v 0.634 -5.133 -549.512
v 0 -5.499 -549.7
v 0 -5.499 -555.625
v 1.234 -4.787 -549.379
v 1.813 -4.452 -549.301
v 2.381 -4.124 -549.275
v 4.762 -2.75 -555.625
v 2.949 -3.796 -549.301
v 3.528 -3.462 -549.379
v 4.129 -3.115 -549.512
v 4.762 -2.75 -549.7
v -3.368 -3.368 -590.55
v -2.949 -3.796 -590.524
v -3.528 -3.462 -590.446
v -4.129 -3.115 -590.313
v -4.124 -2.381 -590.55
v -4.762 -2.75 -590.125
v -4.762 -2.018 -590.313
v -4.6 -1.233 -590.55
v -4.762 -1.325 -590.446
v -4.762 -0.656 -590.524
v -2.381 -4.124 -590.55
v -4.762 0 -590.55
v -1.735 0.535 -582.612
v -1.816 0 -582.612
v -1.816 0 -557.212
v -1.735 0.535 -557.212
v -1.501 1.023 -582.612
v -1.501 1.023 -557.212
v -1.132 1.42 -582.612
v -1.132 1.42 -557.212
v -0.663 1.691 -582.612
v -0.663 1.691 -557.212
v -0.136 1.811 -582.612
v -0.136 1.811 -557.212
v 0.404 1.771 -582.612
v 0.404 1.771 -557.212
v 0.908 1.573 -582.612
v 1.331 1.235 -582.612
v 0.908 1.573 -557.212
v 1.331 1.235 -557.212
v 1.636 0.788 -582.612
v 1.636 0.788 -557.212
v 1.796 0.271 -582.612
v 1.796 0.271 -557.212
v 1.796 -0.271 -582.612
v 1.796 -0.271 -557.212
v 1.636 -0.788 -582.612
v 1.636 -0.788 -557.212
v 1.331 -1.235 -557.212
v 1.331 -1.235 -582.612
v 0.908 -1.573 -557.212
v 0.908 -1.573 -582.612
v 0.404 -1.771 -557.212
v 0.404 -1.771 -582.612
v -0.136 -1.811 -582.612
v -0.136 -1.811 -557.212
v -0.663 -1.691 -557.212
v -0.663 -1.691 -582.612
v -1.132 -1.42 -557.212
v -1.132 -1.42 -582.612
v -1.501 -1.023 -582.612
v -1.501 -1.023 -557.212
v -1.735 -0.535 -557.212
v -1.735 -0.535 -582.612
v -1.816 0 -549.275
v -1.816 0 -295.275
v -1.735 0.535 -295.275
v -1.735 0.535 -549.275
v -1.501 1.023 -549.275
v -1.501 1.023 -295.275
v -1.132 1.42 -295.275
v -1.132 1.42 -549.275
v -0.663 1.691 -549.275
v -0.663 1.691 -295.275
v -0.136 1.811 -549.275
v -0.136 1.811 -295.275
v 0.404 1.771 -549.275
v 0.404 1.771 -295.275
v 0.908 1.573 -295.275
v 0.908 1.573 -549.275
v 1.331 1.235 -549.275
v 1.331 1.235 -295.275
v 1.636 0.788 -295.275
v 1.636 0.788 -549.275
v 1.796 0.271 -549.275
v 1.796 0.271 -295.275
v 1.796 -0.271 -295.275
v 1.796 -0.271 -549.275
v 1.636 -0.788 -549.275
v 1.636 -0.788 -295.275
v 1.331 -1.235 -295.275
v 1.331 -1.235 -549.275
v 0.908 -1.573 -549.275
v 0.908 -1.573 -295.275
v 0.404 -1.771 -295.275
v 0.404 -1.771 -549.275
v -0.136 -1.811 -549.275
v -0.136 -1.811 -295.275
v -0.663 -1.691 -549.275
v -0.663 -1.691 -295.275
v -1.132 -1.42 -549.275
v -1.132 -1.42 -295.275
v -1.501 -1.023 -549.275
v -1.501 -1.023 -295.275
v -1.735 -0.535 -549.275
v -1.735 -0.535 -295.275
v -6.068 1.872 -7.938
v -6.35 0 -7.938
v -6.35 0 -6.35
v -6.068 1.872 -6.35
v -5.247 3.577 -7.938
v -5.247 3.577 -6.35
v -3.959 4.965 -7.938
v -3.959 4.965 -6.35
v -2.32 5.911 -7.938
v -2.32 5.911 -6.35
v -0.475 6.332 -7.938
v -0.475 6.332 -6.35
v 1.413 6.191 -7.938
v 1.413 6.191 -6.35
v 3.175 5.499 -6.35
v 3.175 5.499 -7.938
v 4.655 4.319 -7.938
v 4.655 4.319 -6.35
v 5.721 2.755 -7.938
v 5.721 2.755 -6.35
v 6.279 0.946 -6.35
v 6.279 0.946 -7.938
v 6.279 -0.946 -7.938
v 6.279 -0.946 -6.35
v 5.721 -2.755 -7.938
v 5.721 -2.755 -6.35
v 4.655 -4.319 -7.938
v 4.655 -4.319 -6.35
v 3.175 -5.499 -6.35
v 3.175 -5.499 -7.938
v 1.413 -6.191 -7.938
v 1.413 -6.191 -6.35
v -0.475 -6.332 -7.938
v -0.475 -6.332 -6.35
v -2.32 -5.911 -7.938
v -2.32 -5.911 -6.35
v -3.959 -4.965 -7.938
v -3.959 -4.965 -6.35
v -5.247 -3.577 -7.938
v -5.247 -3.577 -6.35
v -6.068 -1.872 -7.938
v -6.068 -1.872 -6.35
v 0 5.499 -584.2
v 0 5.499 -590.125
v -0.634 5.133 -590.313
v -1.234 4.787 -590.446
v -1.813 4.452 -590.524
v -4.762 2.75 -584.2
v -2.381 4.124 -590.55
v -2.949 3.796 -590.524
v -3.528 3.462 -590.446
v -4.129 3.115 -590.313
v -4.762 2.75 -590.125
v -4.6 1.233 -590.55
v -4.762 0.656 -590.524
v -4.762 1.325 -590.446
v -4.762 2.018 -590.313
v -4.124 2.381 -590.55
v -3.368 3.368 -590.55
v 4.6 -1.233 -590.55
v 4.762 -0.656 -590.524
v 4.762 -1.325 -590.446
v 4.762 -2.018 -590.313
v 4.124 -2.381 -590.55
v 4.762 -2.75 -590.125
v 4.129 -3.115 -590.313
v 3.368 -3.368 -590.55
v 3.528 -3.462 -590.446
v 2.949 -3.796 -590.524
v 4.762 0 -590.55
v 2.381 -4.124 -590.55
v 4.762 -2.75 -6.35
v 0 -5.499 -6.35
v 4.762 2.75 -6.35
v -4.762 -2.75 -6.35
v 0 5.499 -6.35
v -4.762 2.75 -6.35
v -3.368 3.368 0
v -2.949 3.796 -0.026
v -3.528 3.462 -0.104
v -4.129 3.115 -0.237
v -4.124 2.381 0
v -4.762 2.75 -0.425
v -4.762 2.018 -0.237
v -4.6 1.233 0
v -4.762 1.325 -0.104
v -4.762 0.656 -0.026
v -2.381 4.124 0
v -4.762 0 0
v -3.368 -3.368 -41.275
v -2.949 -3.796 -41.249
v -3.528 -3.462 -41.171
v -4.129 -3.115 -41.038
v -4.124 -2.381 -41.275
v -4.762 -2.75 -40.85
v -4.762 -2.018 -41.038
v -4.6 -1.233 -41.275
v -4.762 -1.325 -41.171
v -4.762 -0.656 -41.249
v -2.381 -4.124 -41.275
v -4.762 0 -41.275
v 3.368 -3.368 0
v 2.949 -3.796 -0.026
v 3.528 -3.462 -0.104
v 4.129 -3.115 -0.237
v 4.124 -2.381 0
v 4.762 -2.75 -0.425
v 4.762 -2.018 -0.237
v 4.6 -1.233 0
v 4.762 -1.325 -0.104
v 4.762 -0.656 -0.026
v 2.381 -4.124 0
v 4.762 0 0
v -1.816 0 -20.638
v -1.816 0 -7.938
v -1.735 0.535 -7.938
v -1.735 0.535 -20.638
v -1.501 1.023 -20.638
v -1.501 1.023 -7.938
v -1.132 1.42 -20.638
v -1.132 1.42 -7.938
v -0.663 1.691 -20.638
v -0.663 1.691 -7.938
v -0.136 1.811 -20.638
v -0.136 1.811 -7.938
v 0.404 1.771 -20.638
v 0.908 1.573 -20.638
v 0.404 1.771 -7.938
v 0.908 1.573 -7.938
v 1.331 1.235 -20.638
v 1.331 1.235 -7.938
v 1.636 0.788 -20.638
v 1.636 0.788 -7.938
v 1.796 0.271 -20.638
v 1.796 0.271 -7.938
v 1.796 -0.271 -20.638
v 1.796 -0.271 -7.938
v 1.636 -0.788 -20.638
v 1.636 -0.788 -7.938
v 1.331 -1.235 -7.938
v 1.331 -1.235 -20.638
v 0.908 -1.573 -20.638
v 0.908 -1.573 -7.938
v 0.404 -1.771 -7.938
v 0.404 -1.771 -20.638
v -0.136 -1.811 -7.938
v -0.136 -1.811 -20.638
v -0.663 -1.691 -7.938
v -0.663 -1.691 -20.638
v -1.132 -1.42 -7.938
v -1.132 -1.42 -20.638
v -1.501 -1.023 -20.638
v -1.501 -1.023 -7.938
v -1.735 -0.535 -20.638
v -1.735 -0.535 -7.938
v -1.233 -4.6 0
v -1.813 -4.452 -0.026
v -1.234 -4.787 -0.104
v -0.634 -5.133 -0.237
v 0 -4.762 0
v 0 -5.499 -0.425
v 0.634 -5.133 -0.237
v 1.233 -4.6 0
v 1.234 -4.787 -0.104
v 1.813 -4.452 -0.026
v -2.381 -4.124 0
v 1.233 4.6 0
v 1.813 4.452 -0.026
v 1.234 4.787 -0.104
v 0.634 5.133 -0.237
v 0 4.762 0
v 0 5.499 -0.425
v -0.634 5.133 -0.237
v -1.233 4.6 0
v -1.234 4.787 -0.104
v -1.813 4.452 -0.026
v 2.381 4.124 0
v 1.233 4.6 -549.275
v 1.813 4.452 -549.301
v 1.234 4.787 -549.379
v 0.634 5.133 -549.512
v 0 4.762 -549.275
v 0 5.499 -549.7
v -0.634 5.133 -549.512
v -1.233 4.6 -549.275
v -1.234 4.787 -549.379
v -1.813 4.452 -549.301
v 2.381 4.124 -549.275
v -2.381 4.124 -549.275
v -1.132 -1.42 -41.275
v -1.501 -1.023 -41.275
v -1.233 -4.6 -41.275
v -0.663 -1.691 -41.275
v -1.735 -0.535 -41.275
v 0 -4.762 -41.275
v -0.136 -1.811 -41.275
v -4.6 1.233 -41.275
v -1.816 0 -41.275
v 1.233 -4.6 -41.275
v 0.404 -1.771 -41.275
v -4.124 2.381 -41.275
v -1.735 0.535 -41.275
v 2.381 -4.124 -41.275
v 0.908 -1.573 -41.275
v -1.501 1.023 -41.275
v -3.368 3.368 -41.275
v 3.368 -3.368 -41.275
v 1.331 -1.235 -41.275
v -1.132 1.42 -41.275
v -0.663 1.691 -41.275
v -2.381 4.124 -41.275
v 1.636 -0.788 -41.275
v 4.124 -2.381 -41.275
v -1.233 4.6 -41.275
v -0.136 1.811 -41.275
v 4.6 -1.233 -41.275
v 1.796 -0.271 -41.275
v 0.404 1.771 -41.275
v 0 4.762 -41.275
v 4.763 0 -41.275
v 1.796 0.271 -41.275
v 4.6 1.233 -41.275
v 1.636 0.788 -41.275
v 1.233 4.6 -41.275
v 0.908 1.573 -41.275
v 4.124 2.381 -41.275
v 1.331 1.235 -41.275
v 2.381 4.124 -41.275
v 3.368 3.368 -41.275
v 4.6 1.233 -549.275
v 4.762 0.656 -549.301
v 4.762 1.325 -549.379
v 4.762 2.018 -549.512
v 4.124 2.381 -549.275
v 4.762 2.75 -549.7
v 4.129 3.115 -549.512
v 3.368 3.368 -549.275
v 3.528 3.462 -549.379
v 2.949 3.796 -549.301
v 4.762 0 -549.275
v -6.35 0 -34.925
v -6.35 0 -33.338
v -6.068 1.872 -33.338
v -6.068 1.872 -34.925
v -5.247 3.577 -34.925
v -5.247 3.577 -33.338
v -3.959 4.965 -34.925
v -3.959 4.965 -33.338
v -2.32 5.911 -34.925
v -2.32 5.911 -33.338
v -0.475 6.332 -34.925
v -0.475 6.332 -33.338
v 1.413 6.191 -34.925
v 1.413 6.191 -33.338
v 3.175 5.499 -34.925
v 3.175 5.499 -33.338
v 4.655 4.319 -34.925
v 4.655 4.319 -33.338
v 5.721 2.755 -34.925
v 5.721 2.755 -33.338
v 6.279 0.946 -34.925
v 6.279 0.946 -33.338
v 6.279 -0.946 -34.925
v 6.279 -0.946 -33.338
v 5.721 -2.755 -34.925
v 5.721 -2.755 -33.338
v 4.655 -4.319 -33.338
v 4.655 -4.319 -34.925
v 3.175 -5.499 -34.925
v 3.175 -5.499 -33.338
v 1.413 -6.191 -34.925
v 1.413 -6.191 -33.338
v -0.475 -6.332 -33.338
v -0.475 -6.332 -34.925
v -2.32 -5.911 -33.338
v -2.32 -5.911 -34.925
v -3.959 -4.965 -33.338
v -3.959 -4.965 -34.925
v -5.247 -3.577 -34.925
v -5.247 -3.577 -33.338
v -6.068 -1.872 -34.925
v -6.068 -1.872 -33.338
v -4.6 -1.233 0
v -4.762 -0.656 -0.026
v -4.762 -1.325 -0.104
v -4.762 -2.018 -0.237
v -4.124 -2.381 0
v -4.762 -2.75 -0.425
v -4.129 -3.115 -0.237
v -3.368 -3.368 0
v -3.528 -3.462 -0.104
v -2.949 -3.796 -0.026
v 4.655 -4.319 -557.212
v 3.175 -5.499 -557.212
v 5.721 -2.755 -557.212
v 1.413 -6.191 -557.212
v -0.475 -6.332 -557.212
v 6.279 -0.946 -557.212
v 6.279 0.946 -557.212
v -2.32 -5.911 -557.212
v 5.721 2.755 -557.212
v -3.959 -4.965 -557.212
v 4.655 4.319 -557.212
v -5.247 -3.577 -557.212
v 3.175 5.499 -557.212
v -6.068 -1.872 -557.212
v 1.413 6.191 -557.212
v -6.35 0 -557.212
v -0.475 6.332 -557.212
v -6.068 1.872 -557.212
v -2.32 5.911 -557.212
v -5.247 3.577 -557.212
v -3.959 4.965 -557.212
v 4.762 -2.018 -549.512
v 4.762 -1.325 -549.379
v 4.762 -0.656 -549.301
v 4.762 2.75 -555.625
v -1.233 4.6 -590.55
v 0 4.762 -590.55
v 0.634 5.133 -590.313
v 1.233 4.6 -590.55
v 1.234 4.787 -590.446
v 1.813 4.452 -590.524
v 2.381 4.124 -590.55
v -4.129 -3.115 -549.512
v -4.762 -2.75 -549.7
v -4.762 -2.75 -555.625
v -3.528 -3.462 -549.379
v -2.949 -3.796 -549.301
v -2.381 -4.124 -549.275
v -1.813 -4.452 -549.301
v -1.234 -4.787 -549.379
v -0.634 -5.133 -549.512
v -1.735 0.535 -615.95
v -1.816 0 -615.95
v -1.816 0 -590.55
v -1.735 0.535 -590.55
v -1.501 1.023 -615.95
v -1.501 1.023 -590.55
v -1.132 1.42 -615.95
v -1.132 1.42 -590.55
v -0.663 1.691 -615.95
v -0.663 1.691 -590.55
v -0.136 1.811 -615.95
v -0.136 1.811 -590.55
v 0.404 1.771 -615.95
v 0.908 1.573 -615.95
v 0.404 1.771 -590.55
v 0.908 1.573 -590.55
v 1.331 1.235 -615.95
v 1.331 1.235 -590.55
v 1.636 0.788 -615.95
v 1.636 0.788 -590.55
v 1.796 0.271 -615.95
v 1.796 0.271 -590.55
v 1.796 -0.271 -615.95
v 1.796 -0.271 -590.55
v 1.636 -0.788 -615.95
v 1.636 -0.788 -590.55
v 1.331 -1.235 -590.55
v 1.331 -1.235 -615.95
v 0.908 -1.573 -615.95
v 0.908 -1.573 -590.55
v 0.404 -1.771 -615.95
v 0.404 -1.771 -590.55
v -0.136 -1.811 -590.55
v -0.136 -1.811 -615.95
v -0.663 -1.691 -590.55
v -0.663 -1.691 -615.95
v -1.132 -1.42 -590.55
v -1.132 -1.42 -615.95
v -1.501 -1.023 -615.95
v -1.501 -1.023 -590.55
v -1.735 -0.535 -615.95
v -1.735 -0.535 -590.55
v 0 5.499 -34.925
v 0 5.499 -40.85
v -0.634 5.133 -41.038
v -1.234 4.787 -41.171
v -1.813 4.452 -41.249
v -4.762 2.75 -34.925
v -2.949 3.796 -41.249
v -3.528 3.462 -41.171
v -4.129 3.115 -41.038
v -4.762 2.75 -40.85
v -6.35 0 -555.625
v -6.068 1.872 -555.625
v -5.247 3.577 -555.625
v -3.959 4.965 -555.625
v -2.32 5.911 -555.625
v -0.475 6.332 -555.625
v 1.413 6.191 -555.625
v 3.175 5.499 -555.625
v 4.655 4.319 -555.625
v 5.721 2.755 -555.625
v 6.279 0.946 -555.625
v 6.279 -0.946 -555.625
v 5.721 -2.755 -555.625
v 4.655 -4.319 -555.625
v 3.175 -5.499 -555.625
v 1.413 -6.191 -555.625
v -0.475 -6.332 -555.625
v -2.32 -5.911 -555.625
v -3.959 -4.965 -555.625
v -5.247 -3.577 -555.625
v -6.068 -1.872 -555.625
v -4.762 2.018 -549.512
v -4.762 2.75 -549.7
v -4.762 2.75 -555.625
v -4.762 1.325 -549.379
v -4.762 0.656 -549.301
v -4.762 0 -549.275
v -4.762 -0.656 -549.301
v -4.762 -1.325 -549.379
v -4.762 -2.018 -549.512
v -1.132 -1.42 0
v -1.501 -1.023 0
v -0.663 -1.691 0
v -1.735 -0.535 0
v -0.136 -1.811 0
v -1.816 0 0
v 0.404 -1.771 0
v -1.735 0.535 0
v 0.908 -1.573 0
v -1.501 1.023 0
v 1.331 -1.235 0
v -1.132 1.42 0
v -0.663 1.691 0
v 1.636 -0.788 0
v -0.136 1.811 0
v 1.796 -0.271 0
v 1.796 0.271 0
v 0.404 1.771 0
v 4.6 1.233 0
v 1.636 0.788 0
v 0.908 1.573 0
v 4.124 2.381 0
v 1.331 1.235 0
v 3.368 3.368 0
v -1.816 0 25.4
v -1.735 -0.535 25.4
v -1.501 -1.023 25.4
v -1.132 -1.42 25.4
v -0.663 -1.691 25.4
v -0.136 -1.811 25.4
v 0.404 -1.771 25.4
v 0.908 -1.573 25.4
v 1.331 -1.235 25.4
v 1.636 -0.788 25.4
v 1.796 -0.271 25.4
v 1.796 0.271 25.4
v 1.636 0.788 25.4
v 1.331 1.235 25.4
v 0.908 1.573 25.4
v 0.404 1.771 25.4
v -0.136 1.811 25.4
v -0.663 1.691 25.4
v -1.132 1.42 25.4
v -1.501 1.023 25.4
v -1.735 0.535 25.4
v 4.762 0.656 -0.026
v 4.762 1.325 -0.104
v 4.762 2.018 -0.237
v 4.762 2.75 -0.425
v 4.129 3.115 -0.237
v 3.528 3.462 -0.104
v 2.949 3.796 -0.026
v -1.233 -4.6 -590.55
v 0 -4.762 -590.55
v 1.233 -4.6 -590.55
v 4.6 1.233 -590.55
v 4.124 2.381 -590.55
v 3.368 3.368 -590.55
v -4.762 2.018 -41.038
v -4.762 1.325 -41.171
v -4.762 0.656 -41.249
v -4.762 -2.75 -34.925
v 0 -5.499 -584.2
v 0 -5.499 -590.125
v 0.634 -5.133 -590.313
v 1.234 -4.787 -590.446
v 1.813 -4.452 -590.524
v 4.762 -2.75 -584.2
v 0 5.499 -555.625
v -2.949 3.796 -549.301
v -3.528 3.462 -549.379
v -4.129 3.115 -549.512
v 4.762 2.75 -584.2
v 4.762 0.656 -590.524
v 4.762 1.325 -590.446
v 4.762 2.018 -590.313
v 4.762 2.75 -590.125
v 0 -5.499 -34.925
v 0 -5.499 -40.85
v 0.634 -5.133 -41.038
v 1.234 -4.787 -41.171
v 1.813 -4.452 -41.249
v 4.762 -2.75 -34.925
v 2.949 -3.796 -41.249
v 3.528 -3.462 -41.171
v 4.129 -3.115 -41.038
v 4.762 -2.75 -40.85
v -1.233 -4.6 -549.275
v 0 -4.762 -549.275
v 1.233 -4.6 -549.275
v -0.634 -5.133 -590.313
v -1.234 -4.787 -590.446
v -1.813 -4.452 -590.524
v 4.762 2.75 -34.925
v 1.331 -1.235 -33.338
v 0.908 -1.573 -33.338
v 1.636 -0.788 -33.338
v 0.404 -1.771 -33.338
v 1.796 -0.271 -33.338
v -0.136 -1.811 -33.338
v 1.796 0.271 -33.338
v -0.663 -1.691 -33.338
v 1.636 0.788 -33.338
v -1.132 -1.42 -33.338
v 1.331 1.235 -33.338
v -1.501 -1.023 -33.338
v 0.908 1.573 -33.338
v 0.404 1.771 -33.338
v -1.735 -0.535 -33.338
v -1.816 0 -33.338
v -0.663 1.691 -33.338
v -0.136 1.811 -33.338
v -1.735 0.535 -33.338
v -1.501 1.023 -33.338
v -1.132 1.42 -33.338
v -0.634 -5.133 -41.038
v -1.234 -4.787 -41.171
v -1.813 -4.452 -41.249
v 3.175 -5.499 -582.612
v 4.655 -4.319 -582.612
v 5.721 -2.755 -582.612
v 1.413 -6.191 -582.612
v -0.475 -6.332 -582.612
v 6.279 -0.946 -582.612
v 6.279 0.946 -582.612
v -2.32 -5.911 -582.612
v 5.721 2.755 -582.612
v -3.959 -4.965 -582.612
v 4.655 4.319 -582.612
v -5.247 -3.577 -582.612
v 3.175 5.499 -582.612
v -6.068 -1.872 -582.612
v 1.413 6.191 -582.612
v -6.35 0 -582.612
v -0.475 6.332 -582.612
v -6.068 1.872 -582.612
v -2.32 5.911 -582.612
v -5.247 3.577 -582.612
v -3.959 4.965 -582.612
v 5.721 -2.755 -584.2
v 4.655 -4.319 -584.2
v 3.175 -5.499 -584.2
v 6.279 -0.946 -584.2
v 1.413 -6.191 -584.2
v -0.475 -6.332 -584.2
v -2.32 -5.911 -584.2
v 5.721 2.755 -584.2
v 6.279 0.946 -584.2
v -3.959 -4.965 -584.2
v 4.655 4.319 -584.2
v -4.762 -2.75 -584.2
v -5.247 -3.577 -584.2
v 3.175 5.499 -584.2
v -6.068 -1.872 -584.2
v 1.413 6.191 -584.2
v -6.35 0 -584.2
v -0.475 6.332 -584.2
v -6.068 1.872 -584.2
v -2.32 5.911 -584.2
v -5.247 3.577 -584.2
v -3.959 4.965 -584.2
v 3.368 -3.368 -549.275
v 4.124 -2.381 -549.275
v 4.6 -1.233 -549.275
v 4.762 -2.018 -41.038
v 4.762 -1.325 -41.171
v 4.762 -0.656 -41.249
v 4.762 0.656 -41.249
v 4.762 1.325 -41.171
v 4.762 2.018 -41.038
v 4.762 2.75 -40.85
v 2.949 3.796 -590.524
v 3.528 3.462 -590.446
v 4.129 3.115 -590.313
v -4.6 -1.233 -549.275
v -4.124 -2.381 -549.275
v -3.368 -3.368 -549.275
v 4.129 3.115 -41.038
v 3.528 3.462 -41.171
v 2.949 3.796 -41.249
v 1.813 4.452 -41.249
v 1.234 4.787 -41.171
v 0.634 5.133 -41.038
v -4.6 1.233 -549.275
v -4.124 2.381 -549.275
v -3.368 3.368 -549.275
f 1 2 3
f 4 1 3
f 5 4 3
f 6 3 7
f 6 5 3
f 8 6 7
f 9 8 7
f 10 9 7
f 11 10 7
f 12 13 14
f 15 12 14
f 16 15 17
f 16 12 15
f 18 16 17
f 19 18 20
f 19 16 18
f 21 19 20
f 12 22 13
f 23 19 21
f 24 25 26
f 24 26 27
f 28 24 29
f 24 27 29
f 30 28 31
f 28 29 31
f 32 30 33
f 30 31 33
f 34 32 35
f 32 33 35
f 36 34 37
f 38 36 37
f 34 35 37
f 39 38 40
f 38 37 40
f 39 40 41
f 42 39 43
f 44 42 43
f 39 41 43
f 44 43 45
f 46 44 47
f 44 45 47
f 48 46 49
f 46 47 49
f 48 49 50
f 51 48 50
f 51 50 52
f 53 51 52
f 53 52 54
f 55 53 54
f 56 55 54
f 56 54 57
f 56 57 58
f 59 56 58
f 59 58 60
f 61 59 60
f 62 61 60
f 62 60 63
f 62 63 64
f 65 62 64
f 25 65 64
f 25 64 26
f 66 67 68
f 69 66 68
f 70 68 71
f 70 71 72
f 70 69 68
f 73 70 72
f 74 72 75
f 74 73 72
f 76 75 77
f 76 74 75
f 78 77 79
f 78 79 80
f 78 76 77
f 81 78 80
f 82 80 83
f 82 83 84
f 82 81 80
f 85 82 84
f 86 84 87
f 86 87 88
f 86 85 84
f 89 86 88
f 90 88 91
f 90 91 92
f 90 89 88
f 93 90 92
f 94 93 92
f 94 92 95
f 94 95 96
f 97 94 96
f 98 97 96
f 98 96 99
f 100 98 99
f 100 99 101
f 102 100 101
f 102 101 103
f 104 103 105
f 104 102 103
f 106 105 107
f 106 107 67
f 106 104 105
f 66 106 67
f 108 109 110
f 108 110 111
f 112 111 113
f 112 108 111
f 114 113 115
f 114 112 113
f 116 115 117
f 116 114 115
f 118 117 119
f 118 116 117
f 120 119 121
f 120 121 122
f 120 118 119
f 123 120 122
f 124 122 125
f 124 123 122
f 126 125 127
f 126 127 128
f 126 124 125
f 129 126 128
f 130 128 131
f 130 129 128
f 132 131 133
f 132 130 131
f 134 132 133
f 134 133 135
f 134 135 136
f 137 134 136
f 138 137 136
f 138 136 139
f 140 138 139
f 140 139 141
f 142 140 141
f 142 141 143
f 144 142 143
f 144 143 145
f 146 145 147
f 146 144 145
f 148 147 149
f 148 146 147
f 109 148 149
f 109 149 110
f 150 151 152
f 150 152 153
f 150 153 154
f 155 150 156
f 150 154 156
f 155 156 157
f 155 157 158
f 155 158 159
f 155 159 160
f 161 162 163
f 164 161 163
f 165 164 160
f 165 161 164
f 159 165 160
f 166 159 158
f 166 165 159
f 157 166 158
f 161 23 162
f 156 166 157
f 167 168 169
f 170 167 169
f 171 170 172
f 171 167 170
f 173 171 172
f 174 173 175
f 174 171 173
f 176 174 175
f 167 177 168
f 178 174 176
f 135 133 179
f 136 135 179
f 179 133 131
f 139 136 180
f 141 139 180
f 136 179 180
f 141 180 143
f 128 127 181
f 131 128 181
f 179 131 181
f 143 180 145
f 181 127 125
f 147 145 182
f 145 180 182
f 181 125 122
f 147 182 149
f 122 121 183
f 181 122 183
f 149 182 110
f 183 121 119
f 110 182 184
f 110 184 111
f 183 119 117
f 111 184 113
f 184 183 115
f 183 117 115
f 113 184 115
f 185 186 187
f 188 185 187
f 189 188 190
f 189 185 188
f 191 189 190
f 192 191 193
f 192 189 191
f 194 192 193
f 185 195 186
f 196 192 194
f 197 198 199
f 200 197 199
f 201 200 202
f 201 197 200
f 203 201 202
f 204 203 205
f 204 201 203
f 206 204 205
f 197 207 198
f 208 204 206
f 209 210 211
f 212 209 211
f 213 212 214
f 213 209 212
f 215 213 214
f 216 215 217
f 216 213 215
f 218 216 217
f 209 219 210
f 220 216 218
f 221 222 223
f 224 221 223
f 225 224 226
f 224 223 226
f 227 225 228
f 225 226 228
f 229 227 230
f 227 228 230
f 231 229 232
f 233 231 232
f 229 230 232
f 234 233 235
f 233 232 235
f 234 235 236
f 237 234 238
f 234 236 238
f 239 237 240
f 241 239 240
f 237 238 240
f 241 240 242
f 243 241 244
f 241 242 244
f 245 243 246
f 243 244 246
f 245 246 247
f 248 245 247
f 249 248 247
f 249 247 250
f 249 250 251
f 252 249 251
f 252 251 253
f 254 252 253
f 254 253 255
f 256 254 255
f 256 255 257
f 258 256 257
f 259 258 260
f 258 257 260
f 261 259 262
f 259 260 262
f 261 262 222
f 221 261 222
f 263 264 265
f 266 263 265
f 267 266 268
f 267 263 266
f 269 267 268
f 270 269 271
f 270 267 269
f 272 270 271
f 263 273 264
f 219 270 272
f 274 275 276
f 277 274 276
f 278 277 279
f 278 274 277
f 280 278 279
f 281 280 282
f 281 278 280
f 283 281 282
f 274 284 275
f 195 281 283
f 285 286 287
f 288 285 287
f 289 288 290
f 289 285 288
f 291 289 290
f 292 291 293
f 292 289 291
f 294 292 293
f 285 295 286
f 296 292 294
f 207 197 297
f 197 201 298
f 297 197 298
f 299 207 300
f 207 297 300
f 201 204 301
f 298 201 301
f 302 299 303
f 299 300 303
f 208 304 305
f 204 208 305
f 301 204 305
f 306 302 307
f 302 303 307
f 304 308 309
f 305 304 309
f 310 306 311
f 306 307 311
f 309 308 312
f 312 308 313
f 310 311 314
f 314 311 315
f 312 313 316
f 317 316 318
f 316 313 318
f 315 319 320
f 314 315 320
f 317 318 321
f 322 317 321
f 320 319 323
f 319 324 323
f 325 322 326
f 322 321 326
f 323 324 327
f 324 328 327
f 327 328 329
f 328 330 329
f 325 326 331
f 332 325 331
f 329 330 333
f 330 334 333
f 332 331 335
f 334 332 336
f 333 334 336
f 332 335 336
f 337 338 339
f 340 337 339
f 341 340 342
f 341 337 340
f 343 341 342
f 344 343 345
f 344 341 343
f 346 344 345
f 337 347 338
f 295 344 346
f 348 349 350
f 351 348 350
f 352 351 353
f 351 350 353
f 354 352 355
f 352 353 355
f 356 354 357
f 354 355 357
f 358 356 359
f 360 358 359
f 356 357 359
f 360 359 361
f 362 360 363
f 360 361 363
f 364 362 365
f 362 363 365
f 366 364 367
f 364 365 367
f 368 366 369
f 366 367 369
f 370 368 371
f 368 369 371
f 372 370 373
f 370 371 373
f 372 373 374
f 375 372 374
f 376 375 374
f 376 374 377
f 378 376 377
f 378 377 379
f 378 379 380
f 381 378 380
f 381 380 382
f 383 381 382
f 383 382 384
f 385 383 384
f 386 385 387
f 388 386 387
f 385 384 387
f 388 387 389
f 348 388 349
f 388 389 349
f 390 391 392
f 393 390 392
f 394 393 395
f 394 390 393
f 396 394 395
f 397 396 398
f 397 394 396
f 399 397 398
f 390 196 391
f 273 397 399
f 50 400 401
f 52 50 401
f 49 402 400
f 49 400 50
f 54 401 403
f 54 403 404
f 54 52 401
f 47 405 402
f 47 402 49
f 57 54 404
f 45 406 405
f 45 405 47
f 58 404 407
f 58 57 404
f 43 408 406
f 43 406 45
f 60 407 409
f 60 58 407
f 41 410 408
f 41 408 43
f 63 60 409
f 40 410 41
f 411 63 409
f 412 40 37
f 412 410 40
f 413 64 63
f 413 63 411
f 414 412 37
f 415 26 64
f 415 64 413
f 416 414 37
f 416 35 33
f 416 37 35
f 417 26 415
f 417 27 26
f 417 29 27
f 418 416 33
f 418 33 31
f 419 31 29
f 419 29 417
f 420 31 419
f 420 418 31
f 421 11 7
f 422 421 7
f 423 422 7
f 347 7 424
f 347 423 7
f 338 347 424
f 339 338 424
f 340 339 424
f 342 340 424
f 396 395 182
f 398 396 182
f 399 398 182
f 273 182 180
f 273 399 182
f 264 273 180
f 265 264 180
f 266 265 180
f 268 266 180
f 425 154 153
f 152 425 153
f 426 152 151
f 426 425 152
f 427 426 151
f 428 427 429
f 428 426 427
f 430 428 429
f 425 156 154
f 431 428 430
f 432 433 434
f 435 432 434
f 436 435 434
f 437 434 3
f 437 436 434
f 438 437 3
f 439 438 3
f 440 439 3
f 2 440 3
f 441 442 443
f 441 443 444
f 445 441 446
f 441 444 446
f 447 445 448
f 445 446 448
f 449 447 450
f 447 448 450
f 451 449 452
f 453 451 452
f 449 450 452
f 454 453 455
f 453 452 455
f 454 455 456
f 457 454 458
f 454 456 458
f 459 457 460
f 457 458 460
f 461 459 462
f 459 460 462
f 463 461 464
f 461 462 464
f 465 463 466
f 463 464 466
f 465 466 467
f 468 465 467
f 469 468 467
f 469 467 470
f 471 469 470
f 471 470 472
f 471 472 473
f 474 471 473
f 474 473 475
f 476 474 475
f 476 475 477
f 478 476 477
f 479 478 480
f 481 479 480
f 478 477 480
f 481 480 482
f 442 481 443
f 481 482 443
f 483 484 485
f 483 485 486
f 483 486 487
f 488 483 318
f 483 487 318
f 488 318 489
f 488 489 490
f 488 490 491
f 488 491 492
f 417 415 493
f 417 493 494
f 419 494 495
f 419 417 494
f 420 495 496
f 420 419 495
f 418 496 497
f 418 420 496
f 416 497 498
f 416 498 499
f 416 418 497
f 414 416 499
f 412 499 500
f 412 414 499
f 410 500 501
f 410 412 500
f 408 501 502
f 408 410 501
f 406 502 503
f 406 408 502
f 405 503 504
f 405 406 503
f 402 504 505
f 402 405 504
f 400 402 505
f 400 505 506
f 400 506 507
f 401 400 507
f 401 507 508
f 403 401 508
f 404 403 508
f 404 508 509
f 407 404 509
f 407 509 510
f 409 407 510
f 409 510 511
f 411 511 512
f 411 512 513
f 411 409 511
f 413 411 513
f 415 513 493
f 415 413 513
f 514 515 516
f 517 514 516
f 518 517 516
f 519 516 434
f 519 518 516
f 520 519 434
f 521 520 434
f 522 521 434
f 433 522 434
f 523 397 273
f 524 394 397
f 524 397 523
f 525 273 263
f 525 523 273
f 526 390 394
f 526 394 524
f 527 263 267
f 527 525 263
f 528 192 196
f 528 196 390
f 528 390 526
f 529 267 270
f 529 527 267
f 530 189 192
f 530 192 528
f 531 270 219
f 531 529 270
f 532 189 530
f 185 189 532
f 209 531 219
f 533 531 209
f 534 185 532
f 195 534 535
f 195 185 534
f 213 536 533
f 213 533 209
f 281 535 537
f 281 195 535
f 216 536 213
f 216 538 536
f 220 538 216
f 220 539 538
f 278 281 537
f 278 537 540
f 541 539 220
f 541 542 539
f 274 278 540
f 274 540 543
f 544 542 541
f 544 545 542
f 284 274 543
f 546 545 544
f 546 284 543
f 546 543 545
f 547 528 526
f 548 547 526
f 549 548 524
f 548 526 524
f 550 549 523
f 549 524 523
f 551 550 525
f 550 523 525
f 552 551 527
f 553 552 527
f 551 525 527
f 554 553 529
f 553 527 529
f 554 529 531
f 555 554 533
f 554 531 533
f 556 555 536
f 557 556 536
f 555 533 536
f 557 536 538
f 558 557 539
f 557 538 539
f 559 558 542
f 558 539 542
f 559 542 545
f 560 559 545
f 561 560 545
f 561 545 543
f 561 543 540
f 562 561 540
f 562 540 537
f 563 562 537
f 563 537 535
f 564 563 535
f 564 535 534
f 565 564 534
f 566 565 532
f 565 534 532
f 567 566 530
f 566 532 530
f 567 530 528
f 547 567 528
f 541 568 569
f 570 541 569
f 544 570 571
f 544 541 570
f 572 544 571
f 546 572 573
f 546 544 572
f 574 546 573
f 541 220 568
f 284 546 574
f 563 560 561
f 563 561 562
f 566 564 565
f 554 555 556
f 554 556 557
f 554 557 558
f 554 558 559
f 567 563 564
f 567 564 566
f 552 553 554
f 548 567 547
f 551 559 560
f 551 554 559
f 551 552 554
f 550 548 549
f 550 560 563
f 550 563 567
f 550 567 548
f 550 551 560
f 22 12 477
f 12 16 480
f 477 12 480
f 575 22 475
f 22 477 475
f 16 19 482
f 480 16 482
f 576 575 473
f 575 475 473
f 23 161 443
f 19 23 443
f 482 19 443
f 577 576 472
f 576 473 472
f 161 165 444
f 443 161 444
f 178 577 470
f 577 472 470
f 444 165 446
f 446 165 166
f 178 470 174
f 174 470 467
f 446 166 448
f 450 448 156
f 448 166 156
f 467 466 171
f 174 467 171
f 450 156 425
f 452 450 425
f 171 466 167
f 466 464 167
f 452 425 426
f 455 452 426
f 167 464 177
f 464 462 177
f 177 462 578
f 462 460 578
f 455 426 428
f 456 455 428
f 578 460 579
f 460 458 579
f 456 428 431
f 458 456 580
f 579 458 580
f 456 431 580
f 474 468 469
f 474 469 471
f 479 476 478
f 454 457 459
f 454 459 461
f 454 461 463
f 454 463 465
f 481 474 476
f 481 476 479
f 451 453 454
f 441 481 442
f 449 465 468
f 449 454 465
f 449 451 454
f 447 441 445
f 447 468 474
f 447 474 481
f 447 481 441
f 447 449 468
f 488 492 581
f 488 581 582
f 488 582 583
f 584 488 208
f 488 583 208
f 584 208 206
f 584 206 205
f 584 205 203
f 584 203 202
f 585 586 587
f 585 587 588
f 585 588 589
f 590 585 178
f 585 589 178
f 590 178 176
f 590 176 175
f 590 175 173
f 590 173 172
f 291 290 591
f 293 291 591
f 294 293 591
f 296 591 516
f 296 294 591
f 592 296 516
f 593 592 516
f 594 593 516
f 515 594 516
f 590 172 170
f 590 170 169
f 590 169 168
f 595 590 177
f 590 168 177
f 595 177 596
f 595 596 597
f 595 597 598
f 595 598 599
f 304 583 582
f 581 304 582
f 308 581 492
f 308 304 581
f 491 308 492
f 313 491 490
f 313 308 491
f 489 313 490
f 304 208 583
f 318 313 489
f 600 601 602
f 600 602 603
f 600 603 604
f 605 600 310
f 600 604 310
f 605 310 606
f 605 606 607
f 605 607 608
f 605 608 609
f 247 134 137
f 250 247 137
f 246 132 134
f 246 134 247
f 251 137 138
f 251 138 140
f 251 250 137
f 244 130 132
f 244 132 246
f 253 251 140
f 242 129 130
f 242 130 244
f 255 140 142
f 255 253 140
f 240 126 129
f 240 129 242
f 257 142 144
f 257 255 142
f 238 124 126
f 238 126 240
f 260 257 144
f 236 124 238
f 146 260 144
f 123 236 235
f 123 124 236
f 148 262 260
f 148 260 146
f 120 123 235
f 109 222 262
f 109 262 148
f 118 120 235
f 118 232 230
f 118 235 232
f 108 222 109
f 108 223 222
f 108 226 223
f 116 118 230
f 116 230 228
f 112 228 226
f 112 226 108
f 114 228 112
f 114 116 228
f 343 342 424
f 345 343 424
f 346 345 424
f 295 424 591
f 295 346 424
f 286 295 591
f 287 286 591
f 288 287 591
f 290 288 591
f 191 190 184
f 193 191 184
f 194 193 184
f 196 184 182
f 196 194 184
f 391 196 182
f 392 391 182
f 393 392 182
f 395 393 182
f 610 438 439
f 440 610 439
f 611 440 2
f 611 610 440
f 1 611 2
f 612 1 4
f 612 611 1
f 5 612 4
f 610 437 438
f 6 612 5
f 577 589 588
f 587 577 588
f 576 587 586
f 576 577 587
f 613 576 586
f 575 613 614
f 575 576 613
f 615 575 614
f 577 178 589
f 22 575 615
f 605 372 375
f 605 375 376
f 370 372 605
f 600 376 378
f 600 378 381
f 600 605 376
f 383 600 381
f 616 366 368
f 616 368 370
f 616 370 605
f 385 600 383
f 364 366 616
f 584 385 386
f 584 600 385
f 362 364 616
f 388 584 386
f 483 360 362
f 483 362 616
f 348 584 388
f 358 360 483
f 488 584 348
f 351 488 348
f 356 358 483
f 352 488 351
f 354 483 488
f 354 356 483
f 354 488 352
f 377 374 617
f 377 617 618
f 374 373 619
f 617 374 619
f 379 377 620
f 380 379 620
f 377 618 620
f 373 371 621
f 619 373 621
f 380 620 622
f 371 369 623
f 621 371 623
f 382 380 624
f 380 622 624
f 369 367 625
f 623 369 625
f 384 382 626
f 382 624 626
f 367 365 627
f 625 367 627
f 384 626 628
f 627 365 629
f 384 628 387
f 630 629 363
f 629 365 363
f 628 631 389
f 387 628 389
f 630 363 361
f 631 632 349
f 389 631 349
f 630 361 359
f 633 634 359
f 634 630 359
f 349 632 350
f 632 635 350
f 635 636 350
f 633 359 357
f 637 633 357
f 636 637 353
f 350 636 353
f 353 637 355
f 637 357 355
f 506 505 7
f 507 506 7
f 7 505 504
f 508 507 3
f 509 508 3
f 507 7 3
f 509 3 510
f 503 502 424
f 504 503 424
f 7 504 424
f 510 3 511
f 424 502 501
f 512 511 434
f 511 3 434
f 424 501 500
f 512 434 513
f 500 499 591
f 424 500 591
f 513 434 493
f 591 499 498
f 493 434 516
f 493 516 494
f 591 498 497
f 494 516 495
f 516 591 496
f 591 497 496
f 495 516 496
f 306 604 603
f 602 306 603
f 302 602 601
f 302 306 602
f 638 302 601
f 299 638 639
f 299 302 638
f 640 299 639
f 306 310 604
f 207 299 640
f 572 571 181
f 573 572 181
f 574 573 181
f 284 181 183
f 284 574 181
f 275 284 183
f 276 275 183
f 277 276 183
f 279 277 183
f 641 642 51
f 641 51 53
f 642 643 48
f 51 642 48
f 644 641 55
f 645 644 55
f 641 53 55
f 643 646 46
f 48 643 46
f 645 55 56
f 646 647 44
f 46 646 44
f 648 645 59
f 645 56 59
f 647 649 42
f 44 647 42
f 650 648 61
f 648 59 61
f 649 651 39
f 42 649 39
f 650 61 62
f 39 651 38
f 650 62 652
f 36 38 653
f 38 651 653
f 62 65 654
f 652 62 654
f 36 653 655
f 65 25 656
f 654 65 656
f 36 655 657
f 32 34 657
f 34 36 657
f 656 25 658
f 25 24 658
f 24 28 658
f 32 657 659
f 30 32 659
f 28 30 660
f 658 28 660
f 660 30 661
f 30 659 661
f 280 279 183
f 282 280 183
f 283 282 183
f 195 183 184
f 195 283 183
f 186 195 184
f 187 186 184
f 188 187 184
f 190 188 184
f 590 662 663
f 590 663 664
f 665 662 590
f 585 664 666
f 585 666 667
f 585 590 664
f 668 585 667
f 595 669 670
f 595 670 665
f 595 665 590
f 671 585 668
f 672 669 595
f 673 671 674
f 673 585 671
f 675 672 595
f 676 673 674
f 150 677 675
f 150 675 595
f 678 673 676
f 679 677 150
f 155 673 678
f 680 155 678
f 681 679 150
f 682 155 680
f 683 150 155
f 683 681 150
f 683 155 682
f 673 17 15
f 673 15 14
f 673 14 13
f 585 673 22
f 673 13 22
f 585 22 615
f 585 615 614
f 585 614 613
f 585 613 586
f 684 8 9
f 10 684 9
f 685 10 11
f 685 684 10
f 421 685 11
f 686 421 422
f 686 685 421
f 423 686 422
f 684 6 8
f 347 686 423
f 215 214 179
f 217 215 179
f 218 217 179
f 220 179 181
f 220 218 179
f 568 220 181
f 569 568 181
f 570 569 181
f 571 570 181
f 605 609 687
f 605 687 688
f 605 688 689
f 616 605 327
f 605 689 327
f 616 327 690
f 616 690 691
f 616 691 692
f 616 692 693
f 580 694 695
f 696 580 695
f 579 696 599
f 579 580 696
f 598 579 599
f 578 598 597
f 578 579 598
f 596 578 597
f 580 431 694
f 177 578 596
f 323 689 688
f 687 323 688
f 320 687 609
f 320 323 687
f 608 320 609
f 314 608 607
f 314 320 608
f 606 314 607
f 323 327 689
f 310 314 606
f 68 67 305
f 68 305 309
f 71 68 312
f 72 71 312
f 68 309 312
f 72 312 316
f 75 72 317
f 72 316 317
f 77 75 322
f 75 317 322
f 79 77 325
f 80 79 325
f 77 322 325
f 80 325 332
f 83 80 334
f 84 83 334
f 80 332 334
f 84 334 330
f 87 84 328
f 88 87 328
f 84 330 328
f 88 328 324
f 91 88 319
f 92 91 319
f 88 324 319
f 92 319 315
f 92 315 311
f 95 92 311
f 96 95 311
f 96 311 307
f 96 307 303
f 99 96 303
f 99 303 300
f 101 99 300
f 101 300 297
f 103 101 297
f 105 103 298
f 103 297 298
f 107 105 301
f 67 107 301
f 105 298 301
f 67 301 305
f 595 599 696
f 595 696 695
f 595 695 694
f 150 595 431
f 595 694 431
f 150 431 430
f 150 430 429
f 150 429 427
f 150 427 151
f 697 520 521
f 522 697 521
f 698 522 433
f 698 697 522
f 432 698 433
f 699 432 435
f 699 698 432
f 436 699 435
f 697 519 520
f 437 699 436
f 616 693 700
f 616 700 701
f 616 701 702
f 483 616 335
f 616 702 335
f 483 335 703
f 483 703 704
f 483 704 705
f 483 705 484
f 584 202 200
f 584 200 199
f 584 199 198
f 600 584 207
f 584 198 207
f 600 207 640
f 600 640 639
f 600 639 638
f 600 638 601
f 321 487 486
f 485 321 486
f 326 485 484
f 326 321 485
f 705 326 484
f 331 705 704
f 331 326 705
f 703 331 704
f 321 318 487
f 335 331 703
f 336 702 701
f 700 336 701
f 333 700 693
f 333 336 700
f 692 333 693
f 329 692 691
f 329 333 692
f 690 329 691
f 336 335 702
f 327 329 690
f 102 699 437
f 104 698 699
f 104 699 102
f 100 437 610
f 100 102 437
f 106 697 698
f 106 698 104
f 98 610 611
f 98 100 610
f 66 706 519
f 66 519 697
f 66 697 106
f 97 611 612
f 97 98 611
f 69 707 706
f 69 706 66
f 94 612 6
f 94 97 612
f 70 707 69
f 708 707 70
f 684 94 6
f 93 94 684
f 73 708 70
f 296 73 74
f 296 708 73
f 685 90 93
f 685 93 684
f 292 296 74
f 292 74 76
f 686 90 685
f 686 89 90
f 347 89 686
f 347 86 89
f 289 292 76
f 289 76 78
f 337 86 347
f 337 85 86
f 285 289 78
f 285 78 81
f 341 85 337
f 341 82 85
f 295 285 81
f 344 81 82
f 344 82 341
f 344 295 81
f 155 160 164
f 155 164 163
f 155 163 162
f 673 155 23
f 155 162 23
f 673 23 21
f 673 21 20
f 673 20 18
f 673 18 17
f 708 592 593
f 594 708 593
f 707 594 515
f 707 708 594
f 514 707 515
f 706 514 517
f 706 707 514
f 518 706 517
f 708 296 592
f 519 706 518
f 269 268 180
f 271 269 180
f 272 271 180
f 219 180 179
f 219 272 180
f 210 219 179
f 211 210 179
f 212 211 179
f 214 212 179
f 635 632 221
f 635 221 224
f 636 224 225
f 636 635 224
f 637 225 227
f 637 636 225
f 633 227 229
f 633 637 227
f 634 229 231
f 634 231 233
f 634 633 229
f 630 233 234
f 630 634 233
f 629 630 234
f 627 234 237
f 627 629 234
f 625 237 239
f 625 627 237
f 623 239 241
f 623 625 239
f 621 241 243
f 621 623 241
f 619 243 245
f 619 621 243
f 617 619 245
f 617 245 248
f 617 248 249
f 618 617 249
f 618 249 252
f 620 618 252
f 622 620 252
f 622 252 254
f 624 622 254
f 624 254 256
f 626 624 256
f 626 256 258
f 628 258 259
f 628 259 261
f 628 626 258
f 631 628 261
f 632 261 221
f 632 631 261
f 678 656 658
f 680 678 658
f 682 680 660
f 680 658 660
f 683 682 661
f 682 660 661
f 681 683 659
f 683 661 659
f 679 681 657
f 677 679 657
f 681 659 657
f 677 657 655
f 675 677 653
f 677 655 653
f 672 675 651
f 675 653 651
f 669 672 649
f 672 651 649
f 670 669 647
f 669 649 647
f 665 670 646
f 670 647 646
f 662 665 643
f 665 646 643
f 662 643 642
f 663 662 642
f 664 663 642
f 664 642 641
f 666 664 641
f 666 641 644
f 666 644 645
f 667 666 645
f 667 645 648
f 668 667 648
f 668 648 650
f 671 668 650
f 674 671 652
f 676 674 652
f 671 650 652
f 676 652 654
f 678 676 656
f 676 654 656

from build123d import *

# Parameters (mm, degrees)
EXTRUDE1_DEPTH          = 7.9375
SKETCH13_R              = 6.35
EXTRUDE3_DEPTH          = 1.5875
SKETCH2_OUTSIDE_W       = 63.61
SKETCH2_OUTSIDE_H       = 63.61
SKETCH2_OUTSIDE_R       = 4.7625
CUT_EXTRUDE1_DEPTH      = 12.985362166
CUT_EXTRUDE1_DRAFT      = -60
SKETCH14_R              = 1.8161
BOSS_EXTRUDE1_DEPTH     = 12.7
MIRROR1_COPY_1_SKETCH_W = 63.61
MIRROR1_COPY_1_SKETCH_H = 63.61
MIRROR1_COPY_1_SKETCH_R = 4.7625
MIRROR1_COPY_1_DEPTH    = 12.985362166
MIRROR1_COPY_1_DRAFT    = -60
SKETCH15_R              = 1.8161
BOSS_EXTRUDE2_DEPTH     = 254
MIRROR2_COPY_1_SKETCH_W = 63.61
MIRROR2_COPY_1_SKETCH_H = 63.61
MIRROR2_COPY_1_SKETCH_R = 4.7625
MIRROR2_COPY_1_DEPTH    = 12.985362166
MIRROR2_COPY_1_DRAFT    = -60
MIRROR2_COPY_2_DEPTH    = 7.9375
MIRROR2_COPY_3_SKETCH_R = 6.35
MIRROR2_COPY_3_DEPTH    = 1.5875
MIRROR2_COPY_4_SKETCH_R = 1.8161
MIRROR2_COPY_4_DEPTH    = 12.7
MIRROR2_COPY_5_SKETCH_W = 63.61
MIRROR2_COPY_5_SKETCH_H = 63.61
MIRROR2_COPY_5_SKETCH_R = 4.7625
MIRROR2_COPY_5_DEPTH    = 12.985362166
MIRROR2_COPY_5_DRAFT    = -60
SKETCH16_R              = 1.8161
BOSS_EXTRUDE3_DEPTH     = 25.4
SKETCH4_R               = 1.8161
BOSS_EXTRUDE4_DEPTH     = 25.4


with BuildPart() as part:
    # Sketch1 → Extrude1 (new body)
    with BuildSketch(Plane.XY):
        Polygon((0, 5.499261314), (-4.7625, 2.749630657), (-4.7625, -2.749630657), (0, -5.499261314), (4.7625, -2.749630657), (4.7625, 2.749630657), align=None)
    extrude1 = extrude(amount=-EXTRUDE1_DEPTH)

    # Sketch13 → Extrude3 (add)
    with BuildSketch(Plane(origin=(0, 0, -7.9375), x_dir=(-1, 0, 0), z_dir=(0, 0, -1))):
        Circle(SKETCH13_R)
    extrude3 = extrude(amount=-EXTRUDE3_DEPTH)


with BuildPart() as cut_extrude1_tool:
    # Sketch2 outside → Cut-Extrude1 (with draft: the straight prism first)
    with BuildSketch(Plane.XY):
        Rectangle(SKETCH2_OUTSIDE_W, SKETCH2_OUTSIDE_H)
        Circle(SKETCH2_OUTSIDE_R, mode=Mode.SUBTRACT)
    extrude(amount=-CUT_EXTRUDE1_DEPTH)
    # Cut-Extrude1: the draft: its side faces are tilted about the plane it starts from
    cut_extrude1_sides = [cut_extrude1_tool.faces().sort_by_distance(p)[0] for p in [
        (0, -31.805, -6.492681083),
        (31.805, 0, -6.492681083),
        (0, 31.805, -6.492681083),
        (-31.805, 0, -6.492681083),
        (-4.7625, 0, -6.492681083),
    ]]
    draft(cut_extrude1_sides, Plane.XY, CUT_EXTRUDE1_DRAFT)


with BuildPart() as part_1:
    add(part.part)

    # Cut-Extrude1: cut by cut_extrude1_tool
    add(cut_extrude1_tool.part, mode=Mode.SUBTRACT)

    # Sketch14 → Boss-Extrude1 (add)
    with BuildSketch(Plane(origin=(0, 0, -7.9375), x_dir=(-1, 0, 0), z_dir=(0, 0, -1))):
        Circle(SKETCH14_R)
    boss_extrude1 = extrude(amount=BOSS_EXTRUDE1_DEPTH)

    # Mirror1: Extrude1, Extrude3, Boss-Extrude1 across plane
    add(extrude1.mirror(Plane(origin=(0, 0, -20.6375), x_dir=(1, 0, 0), z_dir=(0, 0, -1))))
    add(extrude3.mirror(Plane(origin=(0, 0, -20.6375), x_dir=(1, 0, 0), z_dir=(0, 0, -1))))
    add(boss_extrude1.mirror(Plane(origin=(0, 0, -20.6375), x_dir=(1, 0, 0), z_dir=(0, 0, -1))))


with BuildPart() as mirror1_copy_1_tool:
    # Mirror1 copy 1 sketch → Mirror1 copy 1 (with draft: the straight prism first)
    with BuildSketch(Plane(origin=(0, 0, -41.275), x_dir=(1, 0, 0), z_dir=(0, 0, -1))):
        Rectangle(MIRROR1_COPY_1_SKETCH_W, MIRROR1_COPY_1_SKETCH_H)
        Circle(MIRROR1_COPY_1_SKETCH_R, mode=Mode.SUBTRACT)
    extrude(amount=-MIRROR1_COPY_1_DEPTH)
    # Mirror1 copy 1: the draft: its side faces are tilted about the plane it starts from
    mirror1_copy_1_sides = [mirror1_copy_1_tool.faces().sort_by_distance(p)[0] for p in [
        (0, -31.805, -34.782318917),
        (31.805, 0, -34.782318917),
        (0, 31.805, -34.782318917),
        (-31.805, 0, -34.782318917),
        (-4.7625, 0, -34.782318917),
    ]]
    draft(mirror1_copy_1_sides, Plane(origin=(0, 0, -41.275), x_dir=(1, 0, 0), z_dir=(0, 0, -1)), MIRROR1_COPY_1_DRAFT)


with BuildPart() as part_2:
    add(part_1.part)

    # Mirror1 copy 1: cut by mirror1_copy_1_tool
    add(mirror1_copy_1_tool.part, mode=Mode.SUBTRACT)

    # Sketch15 → Boss-Extrude2 (add)
    with BuildSketch(Plane(origin=(0, 0, -41.275), x_dir=(-1, 0, 0), z_dir=(0, 0, -1))):
        Circle(SKETCH15_R)
    boss_extrude2 = extrude(amount=BOSS_EXTRUDE2_DEPTH)

    # Mirror2: Extrude1, Extrude3, Boss-Extrude1, Boss-Extrude2 across plane
    add(extrude1.mirror(Plane(origin=(0, 0, -295.275), x_dir=(1, 0, 0), z_dir=(0, 0, -1))))
    add(extrude3.mirror(Plane(origin=(0, 0, -295.275), x_dir=(1, 0, 0), z_dir=(0, 0, -1))))
    add(boss_extrude1.mirror(Plane(origin=(0, 0, -295.275), x_dir=(1, 0, 0), z_dir=(0, 0, -1))))
    add(boss_extrude2.mirror(Plane(origin=(0, 0, -295.275), x_dir=(1, 0, 0), z_dir=(0, 0, -1))))


with BuildPart() as mirror2_copy_1_tool:
    # Mirror2 copy 1 sketch → Mirror2 copy 1 (with draft: the straight prism first)
    with BuildSketch(Plane(origin=(0, 0, -590.55), x_dir=(1, 0, 0), z_dir=(0, 0, -1))):
        Rectangle(MIRROR2_COPY_1_SKETCH_W, MIRROR2_COPY_1_SKETCH_H)
        Circle(MIRROR2_COPY_1_SKETCH_R, mode=Mode.SUBTRACT)
    extrude(amount=-MIRROR2_COPY_1_DEPTH)
    # Mirror2 copy 1: the draft: its side faces are tilted about the plane it starts from
    mirror2_copy_1_sides = [mirror2_copy_1_tool.faces().sort_by_distance(p)[0] for p in [
        (0, -31.805, -584.057318917),
        (31.805, 0, -584.057318917),
        (0, 31.805, -584.057318917),
        (-31.805, 0, -584.057318917),
        (-4.7625, 0, -584.057318917),
    ]]
    draft(mirror2_copy_1_sides, Plane(origin=(0, 0, -590.55), x_dir=(1, 0, 0), z_dir=(0, 0, -1)), MIRROR2_COPY_1_DRAFT)


with BuildPart() as part_3:
    add(part_2.part)

    # Mirror2 copy 1: cut by mirror2_copy_1_tool
    add(mirror2_copy_1_tool.part, mode=Mode.SUBTRACT)

    # Mirror2 copy 2 sketch → Mirror2 copy 2 (add)
    with BuildSketch(Plane.XY.offset(-549.275)):
        Polygon((0, 5.499261314), (-4.7625, 2.749630657), (-4.7625, -2.749630657), (0, -5.499261314), (4.7625, -2.749630657), (4.7625, 2.749630657), align=None)
    extrude(amount=-MIRROR2_COPY_2_DEPTH)

    # Mirror2 copy 3 sketch → Mirror2 copy 3 (add)
    with BuildSketch(Plane(origin=(0, 0, -557.2125), x_dir=(-1, 0, 0), z_dir=(0, 0, -1))):
        Circle(MIRROR2_COPY_3_SKETCH_R)
    extrude(amount=-MIRROR2_COPY_3_DEPTH)

    # Mirror2 copy 4 sketch → Mirror2 copy 4 (add)
    with BuildSketch(Plane(origin=(0, 0, -557.2125), x_dir=(-1, 0, 0), z_dir=(0, 0, -1))):
        Circle(MIRROR2_COPY_4_SKETCH_R)
    extrude(amount=MIRROR2_COPY_4_DEPTH)


with BuildPart() as mirror2_copy_5_tool:
    # Mirror2 copy 5 sketch → Mirror2 copy 5 (with draft: the straight prism first)
    with BuildSketch(Plane.XY.offset(-549.275)):
        Rectangle(MIRROR2_COPY_5_SKETCH_W, MIRROR2_COPY_5_SKETCH_H)
        Circle(MIRROR2_COPY_5_SKETCH_R, mode=Mode.SUBTRACT)
    extrude(amount=-MIRROR2_COPY_5_DEPTH)
    # Mirror2 copy 5: the draft: its side faces are tilted about the plane it starts from
    mirror2_copy_5_sides = [mirror2_copy_5_tool.faces().sort_by_distance(p)[0] for p in [
        (0, -31.805, -555.767681083),
        (31.805, 0, -555.767681083),
        (0, 31.805, -555.767681083),
        (-31.805, 0, -555.767681083),
        (-4.7625, 0, -555.767681083),
    ]]
    draft(mirror2_copy_5_sides, Plane.XY.offset(-549.275), MIRROR2_COPY_5_DRAFT)


with BuildPart() as part_4:
    add(part_3.part)

    # Mirror2 copy 5: cut by mirror2_copy_5_tool
    add(mirror2_copy_5_tool.part, mode=Mode.SUBTRACT)

    # Sketch16 → Boss-Extrude3 (add)
    with BuildSketch(Plane(origin=(0, 0, -590.55), x_dir=(-1, 0, 0), z_dir=(0, 0, -1))):
        Circle(SKETCH16_R)
    extrude(amount=BOSS_EXTRUDE3_DEPTH)

    # Sketch4 → Boss-Extrude4 (add)
    with BuildSketch(Plane.XY):
        with Locations(Location((0, 0, 0), (0, 0, 180))):
            Circle(SKETCH4_R)
    extrude(amount=BOSS_EXTRUDE4_DEPTH)


solid = part_4.part
